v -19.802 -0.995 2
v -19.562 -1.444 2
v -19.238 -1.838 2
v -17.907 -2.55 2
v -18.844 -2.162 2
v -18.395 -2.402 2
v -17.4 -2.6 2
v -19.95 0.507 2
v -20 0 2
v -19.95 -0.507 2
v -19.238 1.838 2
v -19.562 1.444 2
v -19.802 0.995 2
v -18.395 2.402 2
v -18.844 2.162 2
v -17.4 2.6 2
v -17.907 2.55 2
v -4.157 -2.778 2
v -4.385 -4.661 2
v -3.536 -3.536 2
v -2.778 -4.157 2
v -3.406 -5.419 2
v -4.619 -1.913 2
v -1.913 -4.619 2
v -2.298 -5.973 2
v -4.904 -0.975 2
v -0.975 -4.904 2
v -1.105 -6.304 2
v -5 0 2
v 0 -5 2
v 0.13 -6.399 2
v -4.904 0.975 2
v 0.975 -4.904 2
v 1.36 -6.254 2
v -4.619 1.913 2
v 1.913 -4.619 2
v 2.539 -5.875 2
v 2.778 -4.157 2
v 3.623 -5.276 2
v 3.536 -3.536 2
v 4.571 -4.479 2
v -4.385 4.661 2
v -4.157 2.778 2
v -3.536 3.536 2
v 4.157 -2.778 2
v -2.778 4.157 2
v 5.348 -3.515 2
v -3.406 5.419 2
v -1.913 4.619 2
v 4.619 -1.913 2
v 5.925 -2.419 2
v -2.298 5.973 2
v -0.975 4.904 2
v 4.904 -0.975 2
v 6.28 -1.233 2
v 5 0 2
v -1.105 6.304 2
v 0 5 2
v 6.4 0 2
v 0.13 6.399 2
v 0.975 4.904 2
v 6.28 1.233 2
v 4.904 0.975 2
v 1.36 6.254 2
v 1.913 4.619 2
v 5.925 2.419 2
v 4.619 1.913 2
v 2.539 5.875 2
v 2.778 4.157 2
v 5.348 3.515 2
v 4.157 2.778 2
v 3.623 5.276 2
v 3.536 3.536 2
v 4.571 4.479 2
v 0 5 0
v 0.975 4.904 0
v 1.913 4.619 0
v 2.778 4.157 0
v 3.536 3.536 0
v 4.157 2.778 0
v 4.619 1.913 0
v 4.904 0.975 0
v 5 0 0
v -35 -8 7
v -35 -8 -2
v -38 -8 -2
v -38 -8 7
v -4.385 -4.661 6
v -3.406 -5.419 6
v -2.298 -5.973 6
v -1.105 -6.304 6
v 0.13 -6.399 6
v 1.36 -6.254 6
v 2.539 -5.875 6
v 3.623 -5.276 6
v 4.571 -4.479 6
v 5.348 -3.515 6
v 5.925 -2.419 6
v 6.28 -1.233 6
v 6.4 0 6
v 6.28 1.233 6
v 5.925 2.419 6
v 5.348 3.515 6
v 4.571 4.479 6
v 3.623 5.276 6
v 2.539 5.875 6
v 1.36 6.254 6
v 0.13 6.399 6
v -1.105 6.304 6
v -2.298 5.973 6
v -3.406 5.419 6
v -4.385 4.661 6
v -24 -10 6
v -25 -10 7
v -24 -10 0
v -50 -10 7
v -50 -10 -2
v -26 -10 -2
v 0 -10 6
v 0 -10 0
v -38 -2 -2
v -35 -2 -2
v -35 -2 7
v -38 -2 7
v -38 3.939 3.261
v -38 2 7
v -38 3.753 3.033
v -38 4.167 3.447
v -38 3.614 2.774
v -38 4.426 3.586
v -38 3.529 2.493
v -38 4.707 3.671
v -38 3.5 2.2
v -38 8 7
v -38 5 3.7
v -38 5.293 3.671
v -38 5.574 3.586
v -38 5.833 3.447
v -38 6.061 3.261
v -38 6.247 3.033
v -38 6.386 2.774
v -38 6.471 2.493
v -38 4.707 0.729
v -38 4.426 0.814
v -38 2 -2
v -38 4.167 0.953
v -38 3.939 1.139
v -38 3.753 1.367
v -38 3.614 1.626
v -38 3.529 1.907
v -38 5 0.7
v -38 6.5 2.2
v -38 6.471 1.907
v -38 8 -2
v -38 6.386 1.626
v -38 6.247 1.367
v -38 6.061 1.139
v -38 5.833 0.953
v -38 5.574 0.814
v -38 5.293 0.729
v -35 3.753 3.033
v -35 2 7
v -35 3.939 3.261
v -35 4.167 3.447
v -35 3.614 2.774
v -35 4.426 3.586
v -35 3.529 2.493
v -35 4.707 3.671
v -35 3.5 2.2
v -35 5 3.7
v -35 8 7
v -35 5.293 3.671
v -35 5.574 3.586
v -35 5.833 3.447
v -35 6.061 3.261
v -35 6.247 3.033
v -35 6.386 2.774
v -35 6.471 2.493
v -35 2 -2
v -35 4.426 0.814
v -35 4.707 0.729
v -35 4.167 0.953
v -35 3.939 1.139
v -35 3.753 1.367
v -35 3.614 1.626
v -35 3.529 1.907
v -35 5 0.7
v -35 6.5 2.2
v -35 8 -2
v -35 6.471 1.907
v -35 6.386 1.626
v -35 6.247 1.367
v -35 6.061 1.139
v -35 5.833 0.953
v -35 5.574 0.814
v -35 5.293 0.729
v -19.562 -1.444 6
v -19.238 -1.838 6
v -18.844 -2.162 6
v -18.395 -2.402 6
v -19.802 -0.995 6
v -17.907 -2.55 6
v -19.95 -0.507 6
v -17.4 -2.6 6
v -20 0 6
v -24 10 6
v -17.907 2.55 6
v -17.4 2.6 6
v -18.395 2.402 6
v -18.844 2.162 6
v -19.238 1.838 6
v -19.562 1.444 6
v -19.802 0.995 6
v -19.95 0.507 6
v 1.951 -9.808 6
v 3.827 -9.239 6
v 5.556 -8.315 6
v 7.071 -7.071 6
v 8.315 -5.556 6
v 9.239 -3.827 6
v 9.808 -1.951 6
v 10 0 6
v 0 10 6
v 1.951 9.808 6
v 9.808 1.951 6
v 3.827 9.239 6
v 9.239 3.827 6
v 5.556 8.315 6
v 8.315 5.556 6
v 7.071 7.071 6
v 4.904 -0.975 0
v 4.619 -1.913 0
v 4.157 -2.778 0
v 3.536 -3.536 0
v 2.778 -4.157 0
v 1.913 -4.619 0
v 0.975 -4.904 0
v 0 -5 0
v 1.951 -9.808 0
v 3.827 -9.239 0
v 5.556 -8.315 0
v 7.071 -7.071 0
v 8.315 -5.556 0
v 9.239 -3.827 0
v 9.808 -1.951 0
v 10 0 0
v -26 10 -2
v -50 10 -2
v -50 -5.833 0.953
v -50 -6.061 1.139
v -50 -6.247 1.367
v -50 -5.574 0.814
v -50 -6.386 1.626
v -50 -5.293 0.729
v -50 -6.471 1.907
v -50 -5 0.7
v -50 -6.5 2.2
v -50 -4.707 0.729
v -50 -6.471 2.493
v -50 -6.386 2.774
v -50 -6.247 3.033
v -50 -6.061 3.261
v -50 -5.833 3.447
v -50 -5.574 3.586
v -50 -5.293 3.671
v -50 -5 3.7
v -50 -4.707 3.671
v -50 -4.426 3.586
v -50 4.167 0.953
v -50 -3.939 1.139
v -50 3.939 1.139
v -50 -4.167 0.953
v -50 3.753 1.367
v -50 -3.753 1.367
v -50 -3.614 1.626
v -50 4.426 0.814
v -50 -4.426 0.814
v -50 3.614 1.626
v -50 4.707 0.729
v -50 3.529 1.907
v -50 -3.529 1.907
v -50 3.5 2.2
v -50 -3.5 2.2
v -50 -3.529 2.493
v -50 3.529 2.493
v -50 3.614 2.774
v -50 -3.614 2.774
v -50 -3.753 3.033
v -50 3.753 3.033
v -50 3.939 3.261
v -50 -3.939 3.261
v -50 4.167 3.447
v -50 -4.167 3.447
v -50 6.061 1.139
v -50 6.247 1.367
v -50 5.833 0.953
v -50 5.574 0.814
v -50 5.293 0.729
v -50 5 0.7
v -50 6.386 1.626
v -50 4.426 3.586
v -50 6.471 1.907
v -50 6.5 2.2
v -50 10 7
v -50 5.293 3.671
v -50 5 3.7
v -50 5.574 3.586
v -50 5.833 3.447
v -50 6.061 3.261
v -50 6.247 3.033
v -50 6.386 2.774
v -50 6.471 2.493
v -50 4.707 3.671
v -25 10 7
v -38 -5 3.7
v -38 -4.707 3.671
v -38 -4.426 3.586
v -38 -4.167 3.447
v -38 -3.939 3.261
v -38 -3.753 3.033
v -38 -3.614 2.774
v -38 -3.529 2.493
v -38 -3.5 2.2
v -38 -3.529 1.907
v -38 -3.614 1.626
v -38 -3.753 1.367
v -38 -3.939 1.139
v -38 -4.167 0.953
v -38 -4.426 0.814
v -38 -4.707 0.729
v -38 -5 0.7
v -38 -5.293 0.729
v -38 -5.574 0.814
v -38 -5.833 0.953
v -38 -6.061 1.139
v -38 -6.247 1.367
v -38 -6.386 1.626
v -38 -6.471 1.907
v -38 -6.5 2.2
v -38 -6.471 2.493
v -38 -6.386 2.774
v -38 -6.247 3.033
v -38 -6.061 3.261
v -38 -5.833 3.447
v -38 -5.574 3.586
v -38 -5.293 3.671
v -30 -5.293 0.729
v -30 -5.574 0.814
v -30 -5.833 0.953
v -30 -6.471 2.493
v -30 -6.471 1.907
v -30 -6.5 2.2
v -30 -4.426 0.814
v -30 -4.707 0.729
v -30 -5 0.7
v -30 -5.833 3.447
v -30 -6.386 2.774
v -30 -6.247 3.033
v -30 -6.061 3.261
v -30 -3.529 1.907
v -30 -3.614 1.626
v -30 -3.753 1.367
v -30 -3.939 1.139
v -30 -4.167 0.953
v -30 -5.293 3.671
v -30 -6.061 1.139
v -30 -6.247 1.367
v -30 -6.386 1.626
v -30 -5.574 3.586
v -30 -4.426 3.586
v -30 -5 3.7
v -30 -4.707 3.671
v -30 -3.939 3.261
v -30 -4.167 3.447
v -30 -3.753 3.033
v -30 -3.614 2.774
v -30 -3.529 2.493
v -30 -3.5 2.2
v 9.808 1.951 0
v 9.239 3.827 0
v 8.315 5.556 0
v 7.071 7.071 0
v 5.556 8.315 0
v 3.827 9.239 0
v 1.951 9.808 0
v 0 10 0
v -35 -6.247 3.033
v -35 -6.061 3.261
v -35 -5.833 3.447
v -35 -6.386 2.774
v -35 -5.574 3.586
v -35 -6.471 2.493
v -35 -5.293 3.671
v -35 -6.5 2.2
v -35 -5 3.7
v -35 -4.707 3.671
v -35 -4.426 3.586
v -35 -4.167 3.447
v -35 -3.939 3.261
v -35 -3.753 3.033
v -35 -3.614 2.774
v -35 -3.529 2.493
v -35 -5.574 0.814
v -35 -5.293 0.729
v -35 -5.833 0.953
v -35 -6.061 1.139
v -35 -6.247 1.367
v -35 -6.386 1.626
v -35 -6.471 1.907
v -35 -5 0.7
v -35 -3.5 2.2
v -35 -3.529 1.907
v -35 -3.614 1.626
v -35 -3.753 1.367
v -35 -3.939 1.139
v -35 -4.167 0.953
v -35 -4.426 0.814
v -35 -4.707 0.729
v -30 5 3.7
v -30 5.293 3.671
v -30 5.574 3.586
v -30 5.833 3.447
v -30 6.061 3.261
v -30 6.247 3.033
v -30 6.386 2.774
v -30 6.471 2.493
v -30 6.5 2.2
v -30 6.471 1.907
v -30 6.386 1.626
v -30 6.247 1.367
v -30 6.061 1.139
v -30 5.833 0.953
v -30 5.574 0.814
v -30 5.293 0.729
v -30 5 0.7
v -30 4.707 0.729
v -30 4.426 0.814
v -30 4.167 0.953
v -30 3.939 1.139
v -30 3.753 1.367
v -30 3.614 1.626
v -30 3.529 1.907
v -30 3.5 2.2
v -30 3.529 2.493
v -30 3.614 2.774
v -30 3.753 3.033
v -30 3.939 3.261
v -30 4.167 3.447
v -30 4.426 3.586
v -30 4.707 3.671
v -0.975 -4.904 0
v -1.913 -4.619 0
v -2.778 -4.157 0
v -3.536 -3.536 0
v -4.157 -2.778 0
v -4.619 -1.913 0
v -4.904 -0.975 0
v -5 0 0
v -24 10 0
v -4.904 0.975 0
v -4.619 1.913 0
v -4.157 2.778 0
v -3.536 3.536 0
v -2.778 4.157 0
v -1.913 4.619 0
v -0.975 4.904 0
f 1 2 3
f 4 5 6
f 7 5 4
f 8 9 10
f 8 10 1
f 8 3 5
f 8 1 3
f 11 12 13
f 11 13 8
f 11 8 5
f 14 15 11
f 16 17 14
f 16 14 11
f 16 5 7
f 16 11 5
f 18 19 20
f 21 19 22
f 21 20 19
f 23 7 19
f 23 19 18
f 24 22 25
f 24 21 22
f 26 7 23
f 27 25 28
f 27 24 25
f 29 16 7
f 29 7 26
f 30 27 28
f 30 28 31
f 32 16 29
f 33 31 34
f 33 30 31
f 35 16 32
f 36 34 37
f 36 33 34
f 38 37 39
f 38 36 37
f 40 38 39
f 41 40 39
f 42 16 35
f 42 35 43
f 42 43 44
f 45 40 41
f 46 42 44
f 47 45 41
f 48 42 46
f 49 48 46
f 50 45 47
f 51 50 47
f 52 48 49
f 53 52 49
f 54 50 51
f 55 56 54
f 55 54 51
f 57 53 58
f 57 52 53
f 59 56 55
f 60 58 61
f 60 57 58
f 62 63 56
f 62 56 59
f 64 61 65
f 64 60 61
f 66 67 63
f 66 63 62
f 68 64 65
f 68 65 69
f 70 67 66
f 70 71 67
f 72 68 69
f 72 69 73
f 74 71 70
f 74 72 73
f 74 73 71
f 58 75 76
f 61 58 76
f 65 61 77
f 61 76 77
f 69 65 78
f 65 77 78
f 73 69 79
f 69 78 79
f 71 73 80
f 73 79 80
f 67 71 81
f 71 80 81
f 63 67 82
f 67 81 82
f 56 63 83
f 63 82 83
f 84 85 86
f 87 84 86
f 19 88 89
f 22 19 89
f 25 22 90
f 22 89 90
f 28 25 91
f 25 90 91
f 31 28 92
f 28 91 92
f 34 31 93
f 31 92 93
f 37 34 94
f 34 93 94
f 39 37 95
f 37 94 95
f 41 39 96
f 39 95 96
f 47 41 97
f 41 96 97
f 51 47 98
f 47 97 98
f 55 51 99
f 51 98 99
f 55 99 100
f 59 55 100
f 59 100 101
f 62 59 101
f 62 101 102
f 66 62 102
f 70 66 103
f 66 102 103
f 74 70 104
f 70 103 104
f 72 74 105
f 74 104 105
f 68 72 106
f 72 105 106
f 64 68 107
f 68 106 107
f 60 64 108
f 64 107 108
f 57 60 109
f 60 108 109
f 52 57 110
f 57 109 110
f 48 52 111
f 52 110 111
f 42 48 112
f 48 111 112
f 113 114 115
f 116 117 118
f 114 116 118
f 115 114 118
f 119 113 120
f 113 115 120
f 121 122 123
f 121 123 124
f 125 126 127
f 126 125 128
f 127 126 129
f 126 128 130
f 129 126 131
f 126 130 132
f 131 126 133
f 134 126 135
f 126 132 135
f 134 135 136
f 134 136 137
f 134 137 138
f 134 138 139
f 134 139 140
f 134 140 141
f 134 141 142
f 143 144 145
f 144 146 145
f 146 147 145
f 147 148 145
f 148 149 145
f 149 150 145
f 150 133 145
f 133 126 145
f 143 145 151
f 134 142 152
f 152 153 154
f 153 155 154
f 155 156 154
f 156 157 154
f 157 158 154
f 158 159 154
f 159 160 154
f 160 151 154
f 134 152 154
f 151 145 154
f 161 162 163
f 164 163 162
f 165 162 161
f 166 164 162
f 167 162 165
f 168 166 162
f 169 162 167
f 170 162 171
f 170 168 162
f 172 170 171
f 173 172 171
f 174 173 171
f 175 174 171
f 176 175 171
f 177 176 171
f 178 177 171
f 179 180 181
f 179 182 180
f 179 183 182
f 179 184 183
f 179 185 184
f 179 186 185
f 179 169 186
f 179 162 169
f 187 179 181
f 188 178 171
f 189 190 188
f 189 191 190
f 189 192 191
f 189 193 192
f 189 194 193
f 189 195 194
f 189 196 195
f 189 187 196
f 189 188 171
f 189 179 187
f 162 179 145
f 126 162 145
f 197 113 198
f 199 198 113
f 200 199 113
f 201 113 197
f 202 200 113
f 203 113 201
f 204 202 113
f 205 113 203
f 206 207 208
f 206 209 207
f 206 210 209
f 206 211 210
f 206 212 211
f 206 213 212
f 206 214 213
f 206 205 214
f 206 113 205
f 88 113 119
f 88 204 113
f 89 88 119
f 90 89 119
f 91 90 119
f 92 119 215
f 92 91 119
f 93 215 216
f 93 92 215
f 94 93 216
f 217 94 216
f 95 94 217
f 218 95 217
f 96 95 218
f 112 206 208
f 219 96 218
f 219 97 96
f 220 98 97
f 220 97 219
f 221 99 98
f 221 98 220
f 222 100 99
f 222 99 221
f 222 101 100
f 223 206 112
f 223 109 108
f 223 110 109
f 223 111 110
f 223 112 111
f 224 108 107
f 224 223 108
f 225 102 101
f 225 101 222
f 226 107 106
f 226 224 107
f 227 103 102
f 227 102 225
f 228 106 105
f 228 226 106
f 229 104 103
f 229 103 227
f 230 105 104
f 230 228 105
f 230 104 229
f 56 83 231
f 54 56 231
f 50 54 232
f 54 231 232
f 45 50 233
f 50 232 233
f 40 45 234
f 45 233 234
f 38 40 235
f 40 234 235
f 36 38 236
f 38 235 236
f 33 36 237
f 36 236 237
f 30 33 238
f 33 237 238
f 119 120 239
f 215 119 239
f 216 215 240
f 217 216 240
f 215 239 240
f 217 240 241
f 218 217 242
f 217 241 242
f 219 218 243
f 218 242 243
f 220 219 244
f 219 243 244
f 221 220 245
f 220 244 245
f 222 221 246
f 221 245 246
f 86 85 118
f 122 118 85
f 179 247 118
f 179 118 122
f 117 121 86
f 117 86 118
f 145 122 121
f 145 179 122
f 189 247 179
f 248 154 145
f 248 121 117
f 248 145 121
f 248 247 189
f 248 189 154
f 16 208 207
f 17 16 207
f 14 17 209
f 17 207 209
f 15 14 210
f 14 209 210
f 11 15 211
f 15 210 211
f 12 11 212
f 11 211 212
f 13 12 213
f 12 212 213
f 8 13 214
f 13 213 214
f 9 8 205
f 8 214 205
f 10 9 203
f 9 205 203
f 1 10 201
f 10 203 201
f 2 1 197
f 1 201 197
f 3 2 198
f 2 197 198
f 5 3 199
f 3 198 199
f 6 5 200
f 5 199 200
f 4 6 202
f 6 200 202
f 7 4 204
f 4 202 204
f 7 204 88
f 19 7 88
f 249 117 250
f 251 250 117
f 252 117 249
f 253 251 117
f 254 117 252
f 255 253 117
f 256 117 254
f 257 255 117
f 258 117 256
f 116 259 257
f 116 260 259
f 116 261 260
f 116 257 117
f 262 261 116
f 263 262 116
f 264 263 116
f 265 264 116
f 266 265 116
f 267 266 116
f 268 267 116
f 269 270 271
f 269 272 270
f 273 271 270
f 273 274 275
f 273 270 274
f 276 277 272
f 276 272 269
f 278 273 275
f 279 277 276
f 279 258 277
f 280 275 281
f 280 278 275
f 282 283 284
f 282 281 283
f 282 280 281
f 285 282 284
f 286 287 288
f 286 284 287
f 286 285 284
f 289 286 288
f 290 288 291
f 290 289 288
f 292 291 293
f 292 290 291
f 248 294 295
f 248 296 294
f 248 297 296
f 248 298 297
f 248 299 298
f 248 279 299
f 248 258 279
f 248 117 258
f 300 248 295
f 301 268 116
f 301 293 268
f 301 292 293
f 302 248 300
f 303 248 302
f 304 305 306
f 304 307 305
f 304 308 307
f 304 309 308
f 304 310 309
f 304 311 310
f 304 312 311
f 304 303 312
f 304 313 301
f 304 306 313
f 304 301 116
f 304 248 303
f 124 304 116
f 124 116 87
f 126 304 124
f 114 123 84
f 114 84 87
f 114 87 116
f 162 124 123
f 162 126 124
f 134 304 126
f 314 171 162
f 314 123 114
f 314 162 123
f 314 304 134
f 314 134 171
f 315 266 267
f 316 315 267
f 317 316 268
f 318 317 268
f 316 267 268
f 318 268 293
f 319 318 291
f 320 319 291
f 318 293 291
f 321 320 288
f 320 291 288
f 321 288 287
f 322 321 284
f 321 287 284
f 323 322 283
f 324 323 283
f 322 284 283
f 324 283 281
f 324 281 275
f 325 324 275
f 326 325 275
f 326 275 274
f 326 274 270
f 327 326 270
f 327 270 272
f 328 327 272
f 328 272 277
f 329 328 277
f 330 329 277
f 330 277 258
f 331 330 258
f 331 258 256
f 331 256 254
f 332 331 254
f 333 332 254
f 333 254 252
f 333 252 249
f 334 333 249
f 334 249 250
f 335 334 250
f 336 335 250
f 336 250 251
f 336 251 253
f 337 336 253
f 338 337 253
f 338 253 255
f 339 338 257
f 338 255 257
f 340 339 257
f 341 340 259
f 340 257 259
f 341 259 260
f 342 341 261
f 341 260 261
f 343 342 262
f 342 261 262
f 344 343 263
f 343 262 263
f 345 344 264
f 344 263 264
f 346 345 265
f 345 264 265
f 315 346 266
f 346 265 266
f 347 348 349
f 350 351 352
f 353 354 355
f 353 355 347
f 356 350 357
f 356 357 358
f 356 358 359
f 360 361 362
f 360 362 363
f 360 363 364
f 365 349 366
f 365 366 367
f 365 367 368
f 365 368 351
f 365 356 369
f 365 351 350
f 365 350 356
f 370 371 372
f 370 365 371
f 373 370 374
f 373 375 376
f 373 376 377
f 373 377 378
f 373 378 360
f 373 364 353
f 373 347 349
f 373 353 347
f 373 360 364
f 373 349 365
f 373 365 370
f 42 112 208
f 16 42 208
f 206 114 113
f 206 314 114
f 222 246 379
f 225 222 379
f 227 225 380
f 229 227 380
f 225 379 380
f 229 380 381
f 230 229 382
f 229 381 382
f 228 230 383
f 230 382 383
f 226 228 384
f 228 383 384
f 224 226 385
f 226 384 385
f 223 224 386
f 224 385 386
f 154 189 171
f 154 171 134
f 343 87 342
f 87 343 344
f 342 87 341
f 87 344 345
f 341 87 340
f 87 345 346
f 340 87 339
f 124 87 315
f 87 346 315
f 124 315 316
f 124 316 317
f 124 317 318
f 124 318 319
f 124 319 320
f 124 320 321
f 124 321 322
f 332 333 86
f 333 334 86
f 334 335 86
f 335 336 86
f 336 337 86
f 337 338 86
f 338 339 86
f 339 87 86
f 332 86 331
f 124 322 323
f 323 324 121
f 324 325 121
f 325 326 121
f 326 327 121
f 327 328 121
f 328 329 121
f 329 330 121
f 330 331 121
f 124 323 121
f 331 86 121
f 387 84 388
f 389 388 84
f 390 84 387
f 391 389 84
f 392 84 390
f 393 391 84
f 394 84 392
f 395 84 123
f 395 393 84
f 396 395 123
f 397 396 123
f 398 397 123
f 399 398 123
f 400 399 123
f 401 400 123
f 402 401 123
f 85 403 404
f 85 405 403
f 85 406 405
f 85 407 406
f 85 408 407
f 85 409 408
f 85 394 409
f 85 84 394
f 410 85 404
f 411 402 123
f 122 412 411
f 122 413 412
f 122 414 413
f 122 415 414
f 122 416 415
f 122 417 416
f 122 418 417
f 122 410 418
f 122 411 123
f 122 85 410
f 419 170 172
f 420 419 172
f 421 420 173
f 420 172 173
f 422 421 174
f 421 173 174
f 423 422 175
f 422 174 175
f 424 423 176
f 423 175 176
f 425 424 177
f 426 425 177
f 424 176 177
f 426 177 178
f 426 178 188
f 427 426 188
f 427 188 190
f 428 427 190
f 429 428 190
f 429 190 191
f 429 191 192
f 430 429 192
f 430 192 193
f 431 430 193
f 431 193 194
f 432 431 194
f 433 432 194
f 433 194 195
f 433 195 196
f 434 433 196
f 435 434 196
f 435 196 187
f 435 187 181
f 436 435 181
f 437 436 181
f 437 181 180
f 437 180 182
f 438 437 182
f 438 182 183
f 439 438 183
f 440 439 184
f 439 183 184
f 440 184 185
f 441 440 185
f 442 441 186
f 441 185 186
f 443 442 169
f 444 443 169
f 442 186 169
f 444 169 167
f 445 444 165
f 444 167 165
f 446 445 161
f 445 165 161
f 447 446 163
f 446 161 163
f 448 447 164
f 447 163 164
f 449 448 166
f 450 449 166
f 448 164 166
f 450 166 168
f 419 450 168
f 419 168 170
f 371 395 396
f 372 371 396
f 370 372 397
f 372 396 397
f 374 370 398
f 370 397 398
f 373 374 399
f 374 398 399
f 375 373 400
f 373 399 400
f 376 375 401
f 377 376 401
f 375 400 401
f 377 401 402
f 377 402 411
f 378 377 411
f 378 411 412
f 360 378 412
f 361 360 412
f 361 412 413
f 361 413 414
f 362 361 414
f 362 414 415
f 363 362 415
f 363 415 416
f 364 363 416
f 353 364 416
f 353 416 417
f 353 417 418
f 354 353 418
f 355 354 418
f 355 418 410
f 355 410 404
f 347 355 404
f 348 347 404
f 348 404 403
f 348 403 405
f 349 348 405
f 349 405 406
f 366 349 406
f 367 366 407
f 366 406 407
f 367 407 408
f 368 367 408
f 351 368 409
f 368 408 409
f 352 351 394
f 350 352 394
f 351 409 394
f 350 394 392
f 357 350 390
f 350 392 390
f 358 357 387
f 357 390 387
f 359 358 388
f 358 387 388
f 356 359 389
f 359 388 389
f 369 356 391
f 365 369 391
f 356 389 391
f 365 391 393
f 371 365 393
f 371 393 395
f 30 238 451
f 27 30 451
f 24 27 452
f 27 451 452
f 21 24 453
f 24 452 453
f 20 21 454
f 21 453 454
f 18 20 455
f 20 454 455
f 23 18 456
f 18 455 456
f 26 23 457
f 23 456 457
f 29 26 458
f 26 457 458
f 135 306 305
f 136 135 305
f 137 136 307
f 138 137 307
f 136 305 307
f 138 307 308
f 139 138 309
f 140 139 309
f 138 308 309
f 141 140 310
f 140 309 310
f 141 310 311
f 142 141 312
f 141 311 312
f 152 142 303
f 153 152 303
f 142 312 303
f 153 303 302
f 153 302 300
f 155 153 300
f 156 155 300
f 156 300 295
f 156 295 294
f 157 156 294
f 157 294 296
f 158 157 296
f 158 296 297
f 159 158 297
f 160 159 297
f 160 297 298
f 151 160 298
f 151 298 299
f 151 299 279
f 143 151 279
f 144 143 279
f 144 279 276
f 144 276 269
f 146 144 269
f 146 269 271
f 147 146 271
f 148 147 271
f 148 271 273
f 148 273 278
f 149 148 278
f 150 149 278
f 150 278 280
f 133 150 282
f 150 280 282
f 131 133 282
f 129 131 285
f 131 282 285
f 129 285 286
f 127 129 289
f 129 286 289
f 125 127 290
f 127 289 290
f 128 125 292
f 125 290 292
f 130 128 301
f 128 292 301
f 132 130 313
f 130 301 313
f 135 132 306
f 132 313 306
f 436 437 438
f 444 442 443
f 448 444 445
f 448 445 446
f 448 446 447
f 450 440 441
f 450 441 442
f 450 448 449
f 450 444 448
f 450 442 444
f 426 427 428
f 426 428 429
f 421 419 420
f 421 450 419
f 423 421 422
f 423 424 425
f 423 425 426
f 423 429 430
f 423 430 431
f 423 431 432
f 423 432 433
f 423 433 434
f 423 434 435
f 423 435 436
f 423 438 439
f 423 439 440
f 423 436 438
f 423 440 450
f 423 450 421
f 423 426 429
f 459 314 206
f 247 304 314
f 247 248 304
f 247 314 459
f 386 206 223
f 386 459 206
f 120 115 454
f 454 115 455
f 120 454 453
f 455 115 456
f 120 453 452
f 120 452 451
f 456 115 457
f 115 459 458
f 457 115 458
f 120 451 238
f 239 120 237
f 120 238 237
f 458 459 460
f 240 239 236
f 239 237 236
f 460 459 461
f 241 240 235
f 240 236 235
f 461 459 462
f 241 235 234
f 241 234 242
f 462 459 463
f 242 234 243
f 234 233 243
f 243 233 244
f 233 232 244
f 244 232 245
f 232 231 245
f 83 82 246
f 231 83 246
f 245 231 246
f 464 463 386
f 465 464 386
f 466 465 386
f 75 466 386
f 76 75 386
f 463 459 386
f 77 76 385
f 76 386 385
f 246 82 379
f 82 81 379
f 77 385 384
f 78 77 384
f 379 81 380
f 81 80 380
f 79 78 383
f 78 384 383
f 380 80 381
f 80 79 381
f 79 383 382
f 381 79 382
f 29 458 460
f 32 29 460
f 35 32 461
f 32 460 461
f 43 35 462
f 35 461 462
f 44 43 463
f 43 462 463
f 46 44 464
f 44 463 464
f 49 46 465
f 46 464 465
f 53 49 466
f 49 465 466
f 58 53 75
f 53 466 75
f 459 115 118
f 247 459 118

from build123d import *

# Parameters (mm, degrees)
EXTRUDE_1_DEPTH     = 6
CUT_EXTRUDE_1_DEPTH = 4
SKETCH_3_R          = 1.5
CUT_EXTRUDE_2_DEPTH = 20
EXTRUDE_2_DEPTH     = 10
EXTRUDE_3_DEPTH     = 10
SKETCH_5_W          = 3
SKETCH_5_H          = 6
CUT_EXTRUDE_3_DEPTH = 52.778373864


with BuildPart() as part:
    # Эскиз1 → Бобышка-Вытянуть1 (new body)
    with BuildSketch(Plane.XY):
        with BuildLine():
            Line((0, 10), (0, 5))
            ThreePointArc((0, 5), (3.535533906, 3.535533906), (5, 0))
            ThreePointArc((5, 0), (3.535533906, -3.535533906), (0, -5))
            Line((0, -5), (0, -10))
            ThreePointArc((0, -10), (7.071067812, -7.071067812), (10, 0))
            ThreePointArc((10, 0), (7.071067812, 7.071067812), (0, 10))
        make_face()
        with BuildLine():
            ThreePointArc((0, -5), (-3.535533906, -3.535533906), (-5, 0))
            Line((-5, 0), (-10, 0))
            ThreePointArc((-10, 0), (-7.071067812, -7.071067812), (0, -10))
            Line((0, -10), (0, -5))
        make_face()
        with BuildLine():
            Line((-10, 0), (-5, 0))
            ThreePointArc((-5, 0), (-3.535533906, 3.535533906), (0, 5))
            Line((0, 5), (0, 10))
            ThreePointArc((0, 10), (-7.071067812, 7.071067812), (-10, 0))
        make_face()
        with BuildLine():
            ThreePointArc((0, -10), (-7.071067812, -7.071067812), (-10, 0))
            Line((-10, 0), (-50, 0))
            Line((-50, 0), (-50, -10))
            Line((-50, -10), (0, -10))
        make_face()
        with BuildLine():
            Line((-50, 0), (-10, 0))
            ThreePointArc((-10, 0), (-7.071067812, 7.071067812), (0, 10))
            Line((0, 10), (-50, 10))
            Line((-50, 10), (-50, 0))
        make_face()
    extrude(amount=EXTRUDE_1_DEPTH)

    # Эскиз2 → Вырез-Вытянуть1 (cut)
    with BuildSketch(Plane.XY.offset(6)):
        with BuildLine():
            Line((-4.385462329, 4.661300265), (-17.4, 2.6))
            ThreePointArc((-17.4, 2.6), (-20, 0), (-17.4, -2.6))
            Line((-17.4, -2.6), (-4.385462329, -4.661300265))
            ThreePointArc((-4.385462329, -4.661300265), (6.4, 0), (-4.385462329, 4.661300265))
        make_face()
    extrude(amount=-CUT_EXTRUDE_1_DEPTH, mode=Mode.SUBTRACT)

    # Эскиз3 → Вырез-Вытянуть2 (cut)
    with BuildSketch(Plane.ZY.offset(50)):
        with Locations((2.2, 5)):
            Circle(SKETCH_3_R)
        with Locations((2.2, -5)):
            Circle(SKETCH_3_R)
    extrude(amount=-CUT_EXTRUDE_2_DEPTH, mode=Mode.SUBTRACT)

    # Эскиз4 → Бобышка-Вытянуть2 (add, symmetric)
    with BuildSketch(Plane(origin=(0, 0, 0), x_dir=(1, 0, 0), z_dir=(0, 1, 0))):
        Polygon((-50, 0), (-24, 0), (-26, 2), (-50, 2), align=None)
    extrude(amount=EXTRUDE_2_DEPTH, both=True)

    # Эскиз6 → Бобышка-Вытянуть3 (add, symmetric)
    with BuildSketch(Plane(origin=(0, 0, 0), x_dir=(1, 0, 0), z_dir=(0, 1, 0))):
        Polygon((-24, -6), (-50, -6), (-50, -7), (-25, -7), align=None)
    extrude(amount=EXTRUDE_3_DEPTH, both=True)

    # Эскиз5 → Вырез-Вытянуть3 (cut, through all)
    with BuildSketch(Plane(origin=(0, 0, -2), x_dir=(-1, 0, 0), z_dir=(0, 0, -1))):
        with Locations((36.5, -5)):
            Rectangle(SKETCH_5_W, SKETCH_5_H)
        with Locations((36.5, 5)):
            Rectangle(SKETCH_5_W, SKETCH_5_H)
    extrude(amount=-CUT_EXTRUDE_3_DEPTH, mode=Mode.SUBTRACT)


solid = part.part
